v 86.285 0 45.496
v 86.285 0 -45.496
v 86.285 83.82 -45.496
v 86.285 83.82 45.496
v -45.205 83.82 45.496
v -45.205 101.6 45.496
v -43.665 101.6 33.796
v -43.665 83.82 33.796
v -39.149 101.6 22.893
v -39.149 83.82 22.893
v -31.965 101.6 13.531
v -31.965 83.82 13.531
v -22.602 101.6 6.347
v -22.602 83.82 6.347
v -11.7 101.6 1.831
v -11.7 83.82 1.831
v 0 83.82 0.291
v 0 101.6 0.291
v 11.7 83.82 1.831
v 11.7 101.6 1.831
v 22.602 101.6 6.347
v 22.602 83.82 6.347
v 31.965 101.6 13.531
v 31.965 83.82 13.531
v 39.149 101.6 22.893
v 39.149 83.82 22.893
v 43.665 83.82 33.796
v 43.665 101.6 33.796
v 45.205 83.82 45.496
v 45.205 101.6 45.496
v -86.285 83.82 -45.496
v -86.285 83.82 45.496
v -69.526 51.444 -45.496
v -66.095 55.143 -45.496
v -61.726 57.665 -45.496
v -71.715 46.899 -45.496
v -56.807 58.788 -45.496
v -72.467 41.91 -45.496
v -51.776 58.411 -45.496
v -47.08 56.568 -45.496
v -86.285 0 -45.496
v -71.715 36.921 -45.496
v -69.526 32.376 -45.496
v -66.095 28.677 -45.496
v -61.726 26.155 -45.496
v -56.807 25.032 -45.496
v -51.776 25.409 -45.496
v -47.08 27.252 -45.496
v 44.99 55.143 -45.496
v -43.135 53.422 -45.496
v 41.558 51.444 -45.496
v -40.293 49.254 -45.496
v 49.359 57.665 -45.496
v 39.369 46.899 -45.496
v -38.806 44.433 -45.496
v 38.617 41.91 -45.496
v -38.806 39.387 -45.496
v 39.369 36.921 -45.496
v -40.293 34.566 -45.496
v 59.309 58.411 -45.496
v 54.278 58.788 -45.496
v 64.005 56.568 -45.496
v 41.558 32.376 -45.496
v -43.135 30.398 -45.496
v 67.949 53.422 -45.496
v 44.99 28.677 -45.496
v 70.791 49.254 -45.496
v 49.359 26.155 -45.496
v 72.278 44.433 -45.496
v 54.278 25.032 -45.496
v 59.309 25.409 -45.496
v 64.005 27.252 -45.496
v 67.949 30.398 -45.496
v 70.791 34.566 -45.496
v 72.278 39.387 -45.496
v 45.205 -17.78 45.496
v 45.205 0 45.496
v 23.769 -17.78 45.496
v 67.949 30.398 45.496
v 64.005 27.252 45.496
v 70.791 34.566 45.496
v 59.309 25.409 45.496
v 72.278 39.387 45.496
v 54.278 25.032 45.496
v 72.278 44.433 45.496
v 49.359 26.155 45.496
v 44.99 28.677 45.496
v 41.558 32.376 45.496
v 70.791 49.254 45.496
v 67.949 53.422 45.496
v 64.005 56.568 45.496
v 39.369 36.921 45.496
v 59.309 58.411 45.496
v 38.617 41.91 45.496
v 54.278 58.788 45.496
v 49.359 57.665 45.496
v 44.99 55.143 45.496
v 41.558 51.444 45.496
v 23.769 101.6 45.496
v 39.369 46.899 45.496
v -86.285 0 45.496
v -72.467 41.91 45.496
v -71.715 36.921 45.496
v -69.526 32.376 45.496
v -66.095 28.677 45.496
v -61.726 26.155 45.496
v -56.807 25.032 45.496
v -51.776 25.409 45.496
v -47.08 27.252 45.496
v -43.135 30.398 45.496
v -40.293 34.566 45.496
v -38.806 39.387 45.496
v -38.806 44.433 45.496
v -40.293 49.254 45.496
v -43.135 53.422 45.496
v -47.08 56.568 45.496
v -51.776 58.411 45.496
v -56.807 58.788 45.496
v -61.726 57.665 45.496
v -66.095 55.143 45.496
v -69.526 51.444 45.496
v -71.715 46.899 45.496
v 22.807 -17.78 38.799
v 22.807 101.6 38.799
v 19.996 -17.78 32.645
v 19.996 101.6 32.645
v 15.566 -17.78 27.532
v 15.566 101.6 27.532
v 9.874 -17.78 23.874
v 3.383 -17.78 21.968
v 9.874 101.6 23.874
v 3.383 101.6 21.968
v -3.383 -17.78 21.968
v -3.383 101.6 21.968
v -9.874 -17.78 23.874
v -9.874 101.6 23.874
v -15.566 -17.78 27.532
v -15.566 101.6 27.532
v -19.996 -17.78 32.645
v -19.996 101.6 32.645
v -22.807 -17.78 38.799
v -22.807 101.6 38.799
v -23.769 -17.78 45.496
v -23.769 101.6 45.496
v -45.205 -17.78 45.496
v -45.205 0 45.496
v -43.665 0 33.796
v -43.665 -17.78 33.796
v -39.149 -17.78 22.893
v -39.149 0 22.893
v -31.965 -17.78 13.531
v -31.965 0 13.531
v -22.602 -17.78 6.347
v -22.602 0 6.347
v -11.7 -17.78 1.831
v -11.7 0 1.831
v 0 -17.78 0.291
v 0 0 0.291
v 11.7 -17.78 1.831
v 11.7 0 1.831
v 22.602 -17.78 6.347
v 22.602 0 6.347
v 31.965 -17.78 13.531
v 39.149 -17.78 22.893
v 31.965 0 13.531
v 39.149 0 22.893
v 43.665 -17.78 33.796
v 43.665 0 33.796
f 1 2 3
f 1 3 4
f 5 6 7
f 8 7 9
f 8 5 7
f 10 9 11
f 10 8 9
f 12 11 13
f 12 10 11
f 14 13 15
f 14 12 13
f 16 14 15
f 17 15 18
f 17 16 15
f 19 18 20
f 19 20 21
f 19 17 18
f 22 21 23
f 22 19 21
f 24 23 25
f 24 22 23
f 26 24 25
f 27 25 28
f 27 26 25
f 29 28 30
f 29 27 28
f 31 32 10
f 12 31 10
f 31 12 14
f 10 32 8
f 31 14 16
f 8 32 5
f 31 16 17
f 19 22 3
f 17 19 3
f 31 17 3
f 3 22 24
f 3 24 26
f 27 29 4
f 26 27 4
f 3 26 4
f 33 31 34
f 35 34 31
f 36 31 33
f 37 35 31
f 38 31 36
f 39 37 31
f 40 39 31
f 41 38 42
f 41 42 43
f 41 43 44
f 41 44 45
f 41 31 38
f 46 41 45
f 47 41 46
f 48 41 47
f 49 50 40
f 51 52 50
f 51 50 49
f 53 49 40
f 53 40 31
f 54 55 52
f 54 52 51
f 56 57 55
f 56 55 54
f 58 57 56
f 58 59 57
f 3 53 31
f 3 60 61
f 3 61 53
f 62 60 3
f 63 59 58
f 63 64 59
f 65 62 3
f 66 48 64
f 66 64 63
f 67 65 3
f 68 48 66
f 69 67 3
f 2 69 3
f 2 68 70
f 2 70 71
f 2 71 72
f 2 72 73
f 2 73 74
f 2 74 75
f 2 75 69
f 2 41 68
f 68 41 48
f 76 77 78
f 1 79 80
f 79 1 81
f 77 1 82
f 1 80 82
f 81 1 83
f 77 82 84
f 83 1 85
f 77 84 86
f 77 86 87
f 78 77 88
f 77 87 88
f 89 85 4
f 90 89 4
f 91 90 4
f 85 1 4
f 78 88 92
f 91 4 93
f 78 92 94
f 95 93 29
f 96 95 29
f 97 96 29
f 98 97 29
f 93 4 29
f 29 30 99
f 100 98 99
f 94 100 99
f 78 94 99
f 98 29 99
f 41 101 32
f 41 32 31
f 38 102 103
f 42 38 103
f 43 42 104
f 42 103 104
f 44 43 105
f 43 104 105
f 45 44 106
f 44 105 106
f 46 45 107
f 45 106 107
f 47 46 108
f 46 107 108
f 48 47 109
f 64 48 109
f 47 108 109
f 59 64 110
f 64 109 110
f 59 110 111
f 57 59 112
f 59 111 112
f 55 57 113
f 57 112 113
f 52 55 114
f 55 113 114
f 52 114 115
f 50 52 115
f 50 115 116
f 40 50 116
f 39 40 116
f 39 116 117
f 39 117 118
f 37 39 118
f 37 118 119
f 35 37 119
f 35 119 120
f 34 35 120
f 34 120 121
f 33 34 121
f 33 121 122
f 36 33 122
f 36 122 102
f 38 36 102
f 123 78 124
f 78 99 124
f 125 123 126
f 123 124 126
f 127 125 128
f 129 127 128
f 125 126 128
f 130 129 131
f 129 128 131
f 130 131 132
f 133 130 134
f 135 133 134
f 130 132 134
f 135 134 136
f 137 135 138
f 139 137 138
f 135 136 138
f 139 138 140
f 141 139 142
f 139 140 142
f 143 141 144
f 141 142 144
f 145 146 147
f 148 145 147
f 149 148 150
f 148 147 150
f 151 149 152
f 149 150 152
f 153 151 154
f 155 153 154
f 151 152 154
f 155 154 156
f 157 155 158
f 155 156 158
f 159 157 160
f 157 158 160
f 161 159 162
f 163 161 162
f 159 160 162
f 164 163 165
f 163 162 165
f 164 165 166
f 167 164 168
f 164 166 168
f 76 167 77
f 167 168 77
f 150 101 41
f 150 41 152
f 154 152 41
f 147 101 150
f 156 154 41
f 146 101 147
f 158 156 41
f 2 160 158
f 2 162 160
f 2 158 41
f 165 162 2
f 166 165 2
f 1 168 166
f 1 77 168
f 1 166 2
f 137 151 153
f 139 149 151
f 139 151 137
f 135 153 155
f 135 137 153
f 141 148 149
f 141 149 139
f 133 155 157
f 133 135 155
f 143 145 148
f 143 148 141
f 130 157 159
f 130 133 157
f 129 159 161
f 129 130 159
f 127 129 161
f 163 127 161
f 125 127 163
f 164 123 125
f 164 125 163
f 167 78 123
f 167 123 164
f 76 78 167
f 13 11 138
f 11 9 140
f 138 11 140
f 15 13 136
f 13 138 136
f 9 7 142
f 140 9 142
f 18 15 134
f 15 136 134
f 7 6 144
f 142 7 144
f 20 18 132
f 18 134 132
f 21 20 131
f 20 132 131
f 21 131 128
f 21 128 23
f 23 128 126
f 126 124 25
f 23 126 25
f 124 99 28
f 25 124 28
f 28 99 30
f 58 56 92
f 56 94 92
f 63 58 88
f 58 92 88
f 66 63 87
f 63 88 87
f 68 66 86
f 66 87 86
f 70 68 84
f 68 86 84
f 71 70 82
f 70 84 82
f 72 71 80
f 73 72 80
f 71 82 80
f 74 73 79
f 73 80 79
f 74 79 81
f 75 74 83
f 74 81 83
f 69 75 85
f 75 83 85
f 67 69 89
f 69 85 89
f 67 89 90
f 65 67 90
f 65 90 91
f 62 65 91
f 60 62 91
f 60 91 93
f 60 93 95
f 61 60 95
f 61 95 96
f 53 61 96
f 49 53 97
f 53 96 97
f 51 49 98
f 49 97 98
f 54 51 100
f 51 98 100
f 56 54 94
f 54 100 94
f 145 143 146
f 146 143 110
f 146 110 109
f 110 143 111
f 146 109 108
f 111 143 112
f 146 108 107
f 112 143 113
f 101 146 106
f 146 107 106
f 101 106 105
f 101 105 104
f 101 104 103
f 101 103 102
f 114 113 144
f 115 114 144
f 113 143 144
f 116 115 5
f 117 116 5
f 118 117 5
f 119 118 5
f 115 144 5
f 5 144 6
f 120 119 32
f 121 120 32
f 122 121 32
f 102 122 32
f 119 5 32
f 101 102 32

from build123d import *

# Parameters (mm, degrees)
F1_DEPTH      = 83.82
F2_DEPTH      = 101.6
F2_DEPTH_BACK = 17.78
F4_DEPTH      = 176.022


with BuildPart() as f1:
    # F0 (on Front) → F1 (new body)
    with BuildSketch(Plane.XZ):
        with BuildLine():
            Line((-86.2852931023, -45.4958863556), (86.2852931023, -45.4958863556))
            Line((86.2852931023, -45.4958863556), (86.2852931023, 45.4958863556))
            Line((86.2852931023, 45.4958863556), (45.2049326768, 45.4958863556))
            ThreePointArc((45.2049326768, 45.4958863556), (0, 0.2909536789), (-45.2049326768, 45.4958863556))
            Line((-45.2049326768, 45.4958863556), (-86.2852931023, 45.4958863556))
            Line((-86.2852931023, 45.4958863556), (-86.2852931023, -45.4958863556))
        make_face()
    extrude(amount=-F1_DEPTH)

    # F0 (on Front) → F2 (join, two sides)
    with BuildSketch(Plane.XZ) as f2_sk:
        with BuildLine():
            ThreePointArc((-45.2049326768, 45.4958863556), (0, 0.2909536789), (45.2049326768, 45.4958863556))
            Line((45.2049326768, 45.4958863556), (23.7693889097, 45.4958863556))
            ThreePointArc((23.7693889097, 45.4958863556), (0, 21.726497446), (-23.7693889097, 45.4958863556))
            Line((-23.7693889097, 45.4958863556), (-45.2049326768, 45.4958863556))
        make_face()
    extrude(amount=-F2_DEPTH)
    extrude(f2_sk.sketch, amount=F2_DEPTH_BACK)

    # F3 (on face) → F4 (cut, symmetric)
    with BuildSketch(Plane.XY.offset(45.4958863556)):
        with BuildLine():
            ThreePointArc((-38.6172999535, 41.91), (-55.5423423648, 58.8350424113), (-72.4673847761, 41.91))
            Line((-72.4673847761, 41.91), (-38.6172999535, 41.91))
        make_face()
        with BuildLine():
            ThreePointArc((72.4673847761, 41.91), (55.5423423648, 58.8350424113), (38.6172999535, 41.91))
            Line((38.6172999535, 41.91), (72.4673847761, 41.91))
        make_face()
        with BuildLine():
            Line((72.4673847761, 41.91), (38.6172999535, 41.91))
            ThreePointArc((38.6172999535, 41.91), (55.5423423648, 24.9849575887), (72.4673847761, 41.91))
        make_face()
        with BuildLine():
            Line((-38.6172999535, 41.91), (-72.4673847761, 41.91))
            ThreePointArc((-72.4673847761, 41.91), (-55.5423423648, 24.9849575887), (-38.6172999535, 41.91))
        make_face()
    extrude(amount=F4_DEPTH, both=True, mode=Mode.SUBTRACT)


solid = f1.part
